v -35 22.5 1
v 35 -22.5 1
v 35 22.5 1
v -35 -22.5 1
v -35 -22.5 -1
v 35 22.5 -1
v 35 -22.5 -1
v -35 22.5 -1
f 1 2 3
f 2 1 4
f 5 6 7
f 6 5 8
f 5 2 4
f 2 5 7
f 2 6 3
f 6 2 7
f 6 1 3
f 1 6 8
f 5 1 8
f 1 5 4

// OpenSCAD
// ========================================
// a 70 x 45 x 2 mm plate
// NeuroCAD canonical IR; dimensions are millimetres
// ========================================
$fn = 48;

cube(size=[70, 45, 2], center=true);
